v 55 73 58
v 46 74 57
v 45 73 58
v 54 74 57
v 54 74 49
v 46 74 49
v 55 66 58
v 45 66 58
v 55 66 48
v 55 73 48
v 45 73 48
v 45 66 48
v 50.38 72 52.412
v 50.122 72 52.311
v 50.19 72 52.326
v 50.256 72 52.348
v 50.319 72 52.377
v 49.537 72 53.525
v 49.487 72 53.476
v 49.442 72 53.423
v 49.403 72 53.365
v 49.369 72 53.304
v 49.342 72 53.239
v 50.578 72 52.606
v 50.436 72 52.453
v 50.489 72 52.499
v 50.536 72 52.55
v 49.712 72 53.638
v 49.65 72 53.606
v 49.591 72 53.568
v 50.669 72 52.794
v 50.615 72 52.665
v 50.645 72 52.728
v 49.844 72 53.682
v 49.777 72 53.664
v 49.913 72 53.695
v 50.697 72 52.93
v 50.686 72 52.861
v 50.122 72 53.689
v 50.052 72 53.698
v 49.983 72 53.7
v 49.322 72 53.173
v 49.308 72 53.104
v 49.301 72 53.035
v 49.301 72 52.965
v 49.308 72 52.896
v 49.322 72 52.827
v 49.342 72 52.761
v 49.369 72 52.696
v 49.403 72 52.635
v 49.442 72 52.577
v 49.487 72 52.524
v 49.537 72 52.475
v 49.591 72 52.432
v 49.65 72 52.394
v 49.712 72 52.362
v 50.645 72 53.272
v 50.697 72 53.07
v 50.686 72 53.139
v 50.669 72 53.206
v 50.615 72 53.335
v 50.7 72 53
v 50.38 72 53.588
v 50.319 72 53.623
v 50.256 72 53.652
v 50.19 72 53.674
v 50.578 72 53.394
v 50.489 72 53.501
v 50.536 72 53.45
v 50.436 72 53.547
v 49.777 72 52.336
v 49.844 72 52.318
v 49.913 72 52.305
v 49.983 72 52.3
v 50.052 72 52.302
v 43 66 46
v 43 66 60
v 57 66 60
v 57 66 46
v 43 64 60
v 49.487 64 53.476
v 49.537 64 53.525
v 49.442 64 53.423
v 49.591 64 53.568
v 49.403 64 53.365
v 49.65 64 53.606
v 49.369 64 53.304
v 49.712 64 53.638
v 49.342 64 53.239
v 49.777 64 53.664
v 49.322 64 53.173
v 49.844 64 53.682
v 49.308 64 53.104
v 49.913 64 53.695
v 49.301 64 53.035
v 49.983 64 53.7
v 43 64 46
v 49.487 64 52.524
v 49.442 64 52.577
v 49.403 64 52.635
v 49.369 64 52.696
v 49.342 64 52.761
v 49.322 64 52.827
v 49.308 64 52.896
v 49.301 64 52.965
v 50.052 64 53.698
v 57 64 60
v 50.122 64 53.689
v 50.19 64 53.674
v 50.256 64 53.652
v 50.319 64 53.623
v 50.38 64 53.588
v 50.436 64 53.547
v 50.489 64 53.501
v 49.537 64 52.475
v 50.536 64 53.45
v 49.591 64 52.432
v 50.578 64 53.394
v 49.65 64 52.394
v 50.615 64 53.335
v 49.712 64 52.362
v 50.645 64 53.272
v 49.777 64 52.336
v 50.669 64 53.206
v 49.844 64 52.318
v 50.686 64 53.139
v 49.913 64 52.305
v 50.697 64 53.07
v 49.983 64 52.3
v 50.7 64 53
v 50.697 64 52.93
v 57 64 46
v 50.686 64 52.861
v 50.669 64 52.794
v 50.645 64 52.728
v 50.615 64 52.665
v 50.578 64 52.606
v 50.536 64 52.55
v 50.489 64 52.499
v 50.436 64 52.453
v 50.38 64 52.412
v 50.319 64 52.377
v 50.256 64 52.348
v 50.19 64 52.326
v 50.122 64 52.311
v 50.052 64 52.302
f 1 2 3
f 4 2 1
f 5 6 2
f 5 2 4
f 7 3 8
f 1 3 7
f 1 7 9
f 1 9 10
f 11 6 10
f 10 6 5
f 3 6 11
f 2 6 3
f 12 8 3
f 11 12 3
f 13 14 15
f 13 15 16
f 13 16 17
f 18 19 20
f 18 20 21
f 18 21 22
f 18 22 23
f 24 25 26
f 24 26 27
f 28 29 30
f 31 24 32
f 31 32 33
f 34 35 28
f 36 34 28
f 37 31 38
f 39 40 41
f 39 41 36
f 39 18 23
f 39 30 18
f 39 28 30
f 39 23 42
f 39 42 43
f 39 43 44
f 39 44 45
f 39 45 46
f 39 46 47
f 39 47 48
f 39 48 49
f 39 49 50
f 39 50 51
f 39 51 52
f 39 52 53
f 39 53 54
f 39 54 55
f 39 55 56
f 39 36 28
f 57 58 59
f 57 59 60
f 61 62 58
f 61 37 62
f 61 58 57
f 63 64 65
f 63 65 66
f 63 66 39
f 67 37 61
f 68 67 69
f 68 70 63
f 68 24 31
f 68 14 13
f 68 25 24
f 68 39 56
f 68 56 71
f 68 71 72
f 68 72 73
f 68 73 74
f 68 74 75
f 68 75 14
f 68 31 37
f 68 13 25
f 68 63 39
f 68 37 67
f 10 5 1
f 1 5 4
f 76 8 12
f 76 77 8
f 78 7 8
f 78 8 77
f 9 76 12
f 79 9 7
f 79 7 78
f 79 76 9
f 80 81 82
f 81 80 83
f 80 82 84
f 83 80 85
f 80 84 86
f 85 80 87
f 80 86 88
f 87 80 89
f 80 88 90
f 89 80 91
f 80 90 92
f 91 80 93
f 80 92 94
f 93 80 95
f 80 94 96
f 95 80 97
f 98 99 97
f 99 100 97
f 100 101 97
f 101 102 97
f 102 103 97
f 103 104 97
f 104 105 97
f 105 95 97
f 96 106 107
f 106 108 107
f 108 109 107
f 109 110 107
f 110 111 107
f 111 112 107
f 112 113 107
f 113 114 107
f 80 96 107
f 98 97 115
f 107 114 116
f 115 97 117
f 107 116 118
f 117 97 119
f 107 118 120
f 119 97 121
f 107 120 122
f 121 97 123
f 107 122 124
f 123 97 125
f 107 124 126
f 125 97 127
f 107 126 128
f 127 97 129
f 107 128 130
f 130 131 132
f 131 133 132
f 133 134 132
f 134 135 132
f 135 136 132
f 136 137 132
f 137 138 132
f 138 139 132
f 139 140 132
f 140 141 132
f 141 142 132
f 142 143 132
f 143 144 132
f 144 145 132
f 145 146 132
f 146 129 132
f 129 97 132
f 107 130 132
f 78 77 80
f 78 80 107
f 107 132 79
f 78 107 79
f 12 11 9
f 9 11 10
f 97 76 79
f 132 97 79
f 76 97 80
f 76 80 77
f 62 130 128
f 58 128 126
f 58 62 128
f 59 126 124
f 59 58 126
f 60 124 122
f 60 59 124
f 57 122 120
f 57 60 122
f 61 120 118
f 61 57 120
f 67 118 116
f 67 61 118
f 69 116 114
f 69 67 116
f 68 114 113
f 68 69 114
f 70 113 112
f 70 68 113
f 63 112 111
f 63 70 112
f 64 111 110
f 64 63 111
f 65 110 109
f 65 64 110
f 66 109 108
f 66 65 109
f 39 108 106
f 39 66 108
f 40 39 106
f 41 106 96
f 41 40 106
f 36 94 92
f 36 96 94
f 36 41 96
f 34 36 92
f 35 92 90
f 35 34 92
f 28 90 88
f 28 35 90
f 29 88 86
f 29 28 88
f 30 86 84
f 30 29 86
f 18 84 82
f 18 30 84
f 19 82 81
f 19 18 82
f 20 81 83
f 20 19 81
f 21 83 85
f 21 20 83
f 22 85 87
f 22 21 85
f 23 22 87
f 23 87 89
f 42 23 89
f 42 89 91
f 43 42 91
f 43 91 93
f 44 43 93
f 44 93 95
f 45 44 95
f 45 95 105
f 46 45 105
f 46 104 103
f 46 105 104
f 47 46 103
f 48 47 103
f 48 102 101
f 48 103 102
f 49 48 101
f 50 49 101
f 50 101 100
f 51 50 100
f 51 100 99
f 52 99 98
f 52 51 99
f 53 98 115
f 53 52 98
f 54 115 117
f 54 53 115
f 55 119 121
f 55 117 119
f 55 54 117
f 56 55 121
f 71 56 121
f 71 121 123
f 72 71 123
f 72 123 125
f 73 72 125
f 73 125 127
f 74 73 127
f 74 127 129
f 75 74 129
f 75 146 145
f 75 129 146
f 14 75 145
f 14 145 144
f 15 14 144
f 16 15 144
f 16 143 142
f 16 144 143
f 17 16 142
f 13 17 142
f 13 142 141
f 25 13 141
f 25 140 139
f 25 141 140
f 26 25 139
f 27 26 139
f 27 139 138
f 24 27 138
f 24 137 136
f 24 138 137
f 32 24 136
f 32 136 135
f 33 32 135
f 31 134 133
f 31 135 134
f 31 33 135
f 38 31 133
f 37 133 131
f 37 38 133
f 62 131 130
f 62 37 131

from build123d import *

# Parameters (mm, degrees)
CYLINDER041_R          = 0.7
CYLINDER041_DEPTH      = 10
CYLINDER041_ROLL_ANGLE = 90
BOX074_W               = 14
BOX074_H               = 2
BOX074_DEPTH           = 14
BOX073_W               = 10
BOX073_H               = 10
BOX073_DEPTH           = 10
CHAMFER008_SIZE        = 1


with BuildPart() as cylinder073:
    # Cylinder041 → Cylinder041 (new body)
    with BuildSketch(Plane.XY):
        Circle(CYLINDER041_R)
    extrude(amount=CYLINDER041_DEPTH)


with BuildPart() as cylinder073_1:
    # Cylinder041 roll: moved
    add(cylinder073.part.rotate(Axis((0, 0, 0), (1, 0, 0)), CYLINDER041_ROLL_ANGLE))


with BuildPart() as cylinder073_2:
    # Cylinder041 placement: moved
    add(cylinder073_1.part.moved(Location((50, 72, 53))))


with BuildPart() as cube073:
    # Box074 → Box074 (new body)
    with BuildSketch(Plane(origin=(-37, 0, 0), x_dir=(1, 0, 0), z_dir=(0, 0, 1))):
        with Locations((7, 1)):
            Rectangle(BOX074_W, BOX074_H)
    extrude(amount=BOX074_DEPTH)


with BuildPart() as cut086:
    # Box073 → Box073 (new body)
    with BuildSketch(Plane(origin=(-35, 0, 2), x_dir=(1, 0, 0), z_dir=(0, 0, 1))):
        with Locations((5, 5)):
            Rectangle(BOX073_W, BOX073_H)
    extrude(amount=BOX073_DEPTH)

    # Fusion023: union Cube073
    add(cube073.part)


with BuildPart() as cut086_1:
    # Fusion023 placement: moved
    add(cut086.part.moved(Location((80, 64, 46))))

    # Chamfer008
    chamfer008_edges = [cut086_1.edges().sort_by_distance(p)[0] for p in [
        (45, 74, 53),
        (50, 74, 48),
        (55, 74, 53),
        (50, 74, 58),
    ]]
    chamfer(chamfer008_edges, length=CHAMFER008_SIZE)

    # Cut086: cut Cylinder073
    add(cylinder073_2.part, mode=Mode.SUBTRACT)


solid = cut086_1.part
